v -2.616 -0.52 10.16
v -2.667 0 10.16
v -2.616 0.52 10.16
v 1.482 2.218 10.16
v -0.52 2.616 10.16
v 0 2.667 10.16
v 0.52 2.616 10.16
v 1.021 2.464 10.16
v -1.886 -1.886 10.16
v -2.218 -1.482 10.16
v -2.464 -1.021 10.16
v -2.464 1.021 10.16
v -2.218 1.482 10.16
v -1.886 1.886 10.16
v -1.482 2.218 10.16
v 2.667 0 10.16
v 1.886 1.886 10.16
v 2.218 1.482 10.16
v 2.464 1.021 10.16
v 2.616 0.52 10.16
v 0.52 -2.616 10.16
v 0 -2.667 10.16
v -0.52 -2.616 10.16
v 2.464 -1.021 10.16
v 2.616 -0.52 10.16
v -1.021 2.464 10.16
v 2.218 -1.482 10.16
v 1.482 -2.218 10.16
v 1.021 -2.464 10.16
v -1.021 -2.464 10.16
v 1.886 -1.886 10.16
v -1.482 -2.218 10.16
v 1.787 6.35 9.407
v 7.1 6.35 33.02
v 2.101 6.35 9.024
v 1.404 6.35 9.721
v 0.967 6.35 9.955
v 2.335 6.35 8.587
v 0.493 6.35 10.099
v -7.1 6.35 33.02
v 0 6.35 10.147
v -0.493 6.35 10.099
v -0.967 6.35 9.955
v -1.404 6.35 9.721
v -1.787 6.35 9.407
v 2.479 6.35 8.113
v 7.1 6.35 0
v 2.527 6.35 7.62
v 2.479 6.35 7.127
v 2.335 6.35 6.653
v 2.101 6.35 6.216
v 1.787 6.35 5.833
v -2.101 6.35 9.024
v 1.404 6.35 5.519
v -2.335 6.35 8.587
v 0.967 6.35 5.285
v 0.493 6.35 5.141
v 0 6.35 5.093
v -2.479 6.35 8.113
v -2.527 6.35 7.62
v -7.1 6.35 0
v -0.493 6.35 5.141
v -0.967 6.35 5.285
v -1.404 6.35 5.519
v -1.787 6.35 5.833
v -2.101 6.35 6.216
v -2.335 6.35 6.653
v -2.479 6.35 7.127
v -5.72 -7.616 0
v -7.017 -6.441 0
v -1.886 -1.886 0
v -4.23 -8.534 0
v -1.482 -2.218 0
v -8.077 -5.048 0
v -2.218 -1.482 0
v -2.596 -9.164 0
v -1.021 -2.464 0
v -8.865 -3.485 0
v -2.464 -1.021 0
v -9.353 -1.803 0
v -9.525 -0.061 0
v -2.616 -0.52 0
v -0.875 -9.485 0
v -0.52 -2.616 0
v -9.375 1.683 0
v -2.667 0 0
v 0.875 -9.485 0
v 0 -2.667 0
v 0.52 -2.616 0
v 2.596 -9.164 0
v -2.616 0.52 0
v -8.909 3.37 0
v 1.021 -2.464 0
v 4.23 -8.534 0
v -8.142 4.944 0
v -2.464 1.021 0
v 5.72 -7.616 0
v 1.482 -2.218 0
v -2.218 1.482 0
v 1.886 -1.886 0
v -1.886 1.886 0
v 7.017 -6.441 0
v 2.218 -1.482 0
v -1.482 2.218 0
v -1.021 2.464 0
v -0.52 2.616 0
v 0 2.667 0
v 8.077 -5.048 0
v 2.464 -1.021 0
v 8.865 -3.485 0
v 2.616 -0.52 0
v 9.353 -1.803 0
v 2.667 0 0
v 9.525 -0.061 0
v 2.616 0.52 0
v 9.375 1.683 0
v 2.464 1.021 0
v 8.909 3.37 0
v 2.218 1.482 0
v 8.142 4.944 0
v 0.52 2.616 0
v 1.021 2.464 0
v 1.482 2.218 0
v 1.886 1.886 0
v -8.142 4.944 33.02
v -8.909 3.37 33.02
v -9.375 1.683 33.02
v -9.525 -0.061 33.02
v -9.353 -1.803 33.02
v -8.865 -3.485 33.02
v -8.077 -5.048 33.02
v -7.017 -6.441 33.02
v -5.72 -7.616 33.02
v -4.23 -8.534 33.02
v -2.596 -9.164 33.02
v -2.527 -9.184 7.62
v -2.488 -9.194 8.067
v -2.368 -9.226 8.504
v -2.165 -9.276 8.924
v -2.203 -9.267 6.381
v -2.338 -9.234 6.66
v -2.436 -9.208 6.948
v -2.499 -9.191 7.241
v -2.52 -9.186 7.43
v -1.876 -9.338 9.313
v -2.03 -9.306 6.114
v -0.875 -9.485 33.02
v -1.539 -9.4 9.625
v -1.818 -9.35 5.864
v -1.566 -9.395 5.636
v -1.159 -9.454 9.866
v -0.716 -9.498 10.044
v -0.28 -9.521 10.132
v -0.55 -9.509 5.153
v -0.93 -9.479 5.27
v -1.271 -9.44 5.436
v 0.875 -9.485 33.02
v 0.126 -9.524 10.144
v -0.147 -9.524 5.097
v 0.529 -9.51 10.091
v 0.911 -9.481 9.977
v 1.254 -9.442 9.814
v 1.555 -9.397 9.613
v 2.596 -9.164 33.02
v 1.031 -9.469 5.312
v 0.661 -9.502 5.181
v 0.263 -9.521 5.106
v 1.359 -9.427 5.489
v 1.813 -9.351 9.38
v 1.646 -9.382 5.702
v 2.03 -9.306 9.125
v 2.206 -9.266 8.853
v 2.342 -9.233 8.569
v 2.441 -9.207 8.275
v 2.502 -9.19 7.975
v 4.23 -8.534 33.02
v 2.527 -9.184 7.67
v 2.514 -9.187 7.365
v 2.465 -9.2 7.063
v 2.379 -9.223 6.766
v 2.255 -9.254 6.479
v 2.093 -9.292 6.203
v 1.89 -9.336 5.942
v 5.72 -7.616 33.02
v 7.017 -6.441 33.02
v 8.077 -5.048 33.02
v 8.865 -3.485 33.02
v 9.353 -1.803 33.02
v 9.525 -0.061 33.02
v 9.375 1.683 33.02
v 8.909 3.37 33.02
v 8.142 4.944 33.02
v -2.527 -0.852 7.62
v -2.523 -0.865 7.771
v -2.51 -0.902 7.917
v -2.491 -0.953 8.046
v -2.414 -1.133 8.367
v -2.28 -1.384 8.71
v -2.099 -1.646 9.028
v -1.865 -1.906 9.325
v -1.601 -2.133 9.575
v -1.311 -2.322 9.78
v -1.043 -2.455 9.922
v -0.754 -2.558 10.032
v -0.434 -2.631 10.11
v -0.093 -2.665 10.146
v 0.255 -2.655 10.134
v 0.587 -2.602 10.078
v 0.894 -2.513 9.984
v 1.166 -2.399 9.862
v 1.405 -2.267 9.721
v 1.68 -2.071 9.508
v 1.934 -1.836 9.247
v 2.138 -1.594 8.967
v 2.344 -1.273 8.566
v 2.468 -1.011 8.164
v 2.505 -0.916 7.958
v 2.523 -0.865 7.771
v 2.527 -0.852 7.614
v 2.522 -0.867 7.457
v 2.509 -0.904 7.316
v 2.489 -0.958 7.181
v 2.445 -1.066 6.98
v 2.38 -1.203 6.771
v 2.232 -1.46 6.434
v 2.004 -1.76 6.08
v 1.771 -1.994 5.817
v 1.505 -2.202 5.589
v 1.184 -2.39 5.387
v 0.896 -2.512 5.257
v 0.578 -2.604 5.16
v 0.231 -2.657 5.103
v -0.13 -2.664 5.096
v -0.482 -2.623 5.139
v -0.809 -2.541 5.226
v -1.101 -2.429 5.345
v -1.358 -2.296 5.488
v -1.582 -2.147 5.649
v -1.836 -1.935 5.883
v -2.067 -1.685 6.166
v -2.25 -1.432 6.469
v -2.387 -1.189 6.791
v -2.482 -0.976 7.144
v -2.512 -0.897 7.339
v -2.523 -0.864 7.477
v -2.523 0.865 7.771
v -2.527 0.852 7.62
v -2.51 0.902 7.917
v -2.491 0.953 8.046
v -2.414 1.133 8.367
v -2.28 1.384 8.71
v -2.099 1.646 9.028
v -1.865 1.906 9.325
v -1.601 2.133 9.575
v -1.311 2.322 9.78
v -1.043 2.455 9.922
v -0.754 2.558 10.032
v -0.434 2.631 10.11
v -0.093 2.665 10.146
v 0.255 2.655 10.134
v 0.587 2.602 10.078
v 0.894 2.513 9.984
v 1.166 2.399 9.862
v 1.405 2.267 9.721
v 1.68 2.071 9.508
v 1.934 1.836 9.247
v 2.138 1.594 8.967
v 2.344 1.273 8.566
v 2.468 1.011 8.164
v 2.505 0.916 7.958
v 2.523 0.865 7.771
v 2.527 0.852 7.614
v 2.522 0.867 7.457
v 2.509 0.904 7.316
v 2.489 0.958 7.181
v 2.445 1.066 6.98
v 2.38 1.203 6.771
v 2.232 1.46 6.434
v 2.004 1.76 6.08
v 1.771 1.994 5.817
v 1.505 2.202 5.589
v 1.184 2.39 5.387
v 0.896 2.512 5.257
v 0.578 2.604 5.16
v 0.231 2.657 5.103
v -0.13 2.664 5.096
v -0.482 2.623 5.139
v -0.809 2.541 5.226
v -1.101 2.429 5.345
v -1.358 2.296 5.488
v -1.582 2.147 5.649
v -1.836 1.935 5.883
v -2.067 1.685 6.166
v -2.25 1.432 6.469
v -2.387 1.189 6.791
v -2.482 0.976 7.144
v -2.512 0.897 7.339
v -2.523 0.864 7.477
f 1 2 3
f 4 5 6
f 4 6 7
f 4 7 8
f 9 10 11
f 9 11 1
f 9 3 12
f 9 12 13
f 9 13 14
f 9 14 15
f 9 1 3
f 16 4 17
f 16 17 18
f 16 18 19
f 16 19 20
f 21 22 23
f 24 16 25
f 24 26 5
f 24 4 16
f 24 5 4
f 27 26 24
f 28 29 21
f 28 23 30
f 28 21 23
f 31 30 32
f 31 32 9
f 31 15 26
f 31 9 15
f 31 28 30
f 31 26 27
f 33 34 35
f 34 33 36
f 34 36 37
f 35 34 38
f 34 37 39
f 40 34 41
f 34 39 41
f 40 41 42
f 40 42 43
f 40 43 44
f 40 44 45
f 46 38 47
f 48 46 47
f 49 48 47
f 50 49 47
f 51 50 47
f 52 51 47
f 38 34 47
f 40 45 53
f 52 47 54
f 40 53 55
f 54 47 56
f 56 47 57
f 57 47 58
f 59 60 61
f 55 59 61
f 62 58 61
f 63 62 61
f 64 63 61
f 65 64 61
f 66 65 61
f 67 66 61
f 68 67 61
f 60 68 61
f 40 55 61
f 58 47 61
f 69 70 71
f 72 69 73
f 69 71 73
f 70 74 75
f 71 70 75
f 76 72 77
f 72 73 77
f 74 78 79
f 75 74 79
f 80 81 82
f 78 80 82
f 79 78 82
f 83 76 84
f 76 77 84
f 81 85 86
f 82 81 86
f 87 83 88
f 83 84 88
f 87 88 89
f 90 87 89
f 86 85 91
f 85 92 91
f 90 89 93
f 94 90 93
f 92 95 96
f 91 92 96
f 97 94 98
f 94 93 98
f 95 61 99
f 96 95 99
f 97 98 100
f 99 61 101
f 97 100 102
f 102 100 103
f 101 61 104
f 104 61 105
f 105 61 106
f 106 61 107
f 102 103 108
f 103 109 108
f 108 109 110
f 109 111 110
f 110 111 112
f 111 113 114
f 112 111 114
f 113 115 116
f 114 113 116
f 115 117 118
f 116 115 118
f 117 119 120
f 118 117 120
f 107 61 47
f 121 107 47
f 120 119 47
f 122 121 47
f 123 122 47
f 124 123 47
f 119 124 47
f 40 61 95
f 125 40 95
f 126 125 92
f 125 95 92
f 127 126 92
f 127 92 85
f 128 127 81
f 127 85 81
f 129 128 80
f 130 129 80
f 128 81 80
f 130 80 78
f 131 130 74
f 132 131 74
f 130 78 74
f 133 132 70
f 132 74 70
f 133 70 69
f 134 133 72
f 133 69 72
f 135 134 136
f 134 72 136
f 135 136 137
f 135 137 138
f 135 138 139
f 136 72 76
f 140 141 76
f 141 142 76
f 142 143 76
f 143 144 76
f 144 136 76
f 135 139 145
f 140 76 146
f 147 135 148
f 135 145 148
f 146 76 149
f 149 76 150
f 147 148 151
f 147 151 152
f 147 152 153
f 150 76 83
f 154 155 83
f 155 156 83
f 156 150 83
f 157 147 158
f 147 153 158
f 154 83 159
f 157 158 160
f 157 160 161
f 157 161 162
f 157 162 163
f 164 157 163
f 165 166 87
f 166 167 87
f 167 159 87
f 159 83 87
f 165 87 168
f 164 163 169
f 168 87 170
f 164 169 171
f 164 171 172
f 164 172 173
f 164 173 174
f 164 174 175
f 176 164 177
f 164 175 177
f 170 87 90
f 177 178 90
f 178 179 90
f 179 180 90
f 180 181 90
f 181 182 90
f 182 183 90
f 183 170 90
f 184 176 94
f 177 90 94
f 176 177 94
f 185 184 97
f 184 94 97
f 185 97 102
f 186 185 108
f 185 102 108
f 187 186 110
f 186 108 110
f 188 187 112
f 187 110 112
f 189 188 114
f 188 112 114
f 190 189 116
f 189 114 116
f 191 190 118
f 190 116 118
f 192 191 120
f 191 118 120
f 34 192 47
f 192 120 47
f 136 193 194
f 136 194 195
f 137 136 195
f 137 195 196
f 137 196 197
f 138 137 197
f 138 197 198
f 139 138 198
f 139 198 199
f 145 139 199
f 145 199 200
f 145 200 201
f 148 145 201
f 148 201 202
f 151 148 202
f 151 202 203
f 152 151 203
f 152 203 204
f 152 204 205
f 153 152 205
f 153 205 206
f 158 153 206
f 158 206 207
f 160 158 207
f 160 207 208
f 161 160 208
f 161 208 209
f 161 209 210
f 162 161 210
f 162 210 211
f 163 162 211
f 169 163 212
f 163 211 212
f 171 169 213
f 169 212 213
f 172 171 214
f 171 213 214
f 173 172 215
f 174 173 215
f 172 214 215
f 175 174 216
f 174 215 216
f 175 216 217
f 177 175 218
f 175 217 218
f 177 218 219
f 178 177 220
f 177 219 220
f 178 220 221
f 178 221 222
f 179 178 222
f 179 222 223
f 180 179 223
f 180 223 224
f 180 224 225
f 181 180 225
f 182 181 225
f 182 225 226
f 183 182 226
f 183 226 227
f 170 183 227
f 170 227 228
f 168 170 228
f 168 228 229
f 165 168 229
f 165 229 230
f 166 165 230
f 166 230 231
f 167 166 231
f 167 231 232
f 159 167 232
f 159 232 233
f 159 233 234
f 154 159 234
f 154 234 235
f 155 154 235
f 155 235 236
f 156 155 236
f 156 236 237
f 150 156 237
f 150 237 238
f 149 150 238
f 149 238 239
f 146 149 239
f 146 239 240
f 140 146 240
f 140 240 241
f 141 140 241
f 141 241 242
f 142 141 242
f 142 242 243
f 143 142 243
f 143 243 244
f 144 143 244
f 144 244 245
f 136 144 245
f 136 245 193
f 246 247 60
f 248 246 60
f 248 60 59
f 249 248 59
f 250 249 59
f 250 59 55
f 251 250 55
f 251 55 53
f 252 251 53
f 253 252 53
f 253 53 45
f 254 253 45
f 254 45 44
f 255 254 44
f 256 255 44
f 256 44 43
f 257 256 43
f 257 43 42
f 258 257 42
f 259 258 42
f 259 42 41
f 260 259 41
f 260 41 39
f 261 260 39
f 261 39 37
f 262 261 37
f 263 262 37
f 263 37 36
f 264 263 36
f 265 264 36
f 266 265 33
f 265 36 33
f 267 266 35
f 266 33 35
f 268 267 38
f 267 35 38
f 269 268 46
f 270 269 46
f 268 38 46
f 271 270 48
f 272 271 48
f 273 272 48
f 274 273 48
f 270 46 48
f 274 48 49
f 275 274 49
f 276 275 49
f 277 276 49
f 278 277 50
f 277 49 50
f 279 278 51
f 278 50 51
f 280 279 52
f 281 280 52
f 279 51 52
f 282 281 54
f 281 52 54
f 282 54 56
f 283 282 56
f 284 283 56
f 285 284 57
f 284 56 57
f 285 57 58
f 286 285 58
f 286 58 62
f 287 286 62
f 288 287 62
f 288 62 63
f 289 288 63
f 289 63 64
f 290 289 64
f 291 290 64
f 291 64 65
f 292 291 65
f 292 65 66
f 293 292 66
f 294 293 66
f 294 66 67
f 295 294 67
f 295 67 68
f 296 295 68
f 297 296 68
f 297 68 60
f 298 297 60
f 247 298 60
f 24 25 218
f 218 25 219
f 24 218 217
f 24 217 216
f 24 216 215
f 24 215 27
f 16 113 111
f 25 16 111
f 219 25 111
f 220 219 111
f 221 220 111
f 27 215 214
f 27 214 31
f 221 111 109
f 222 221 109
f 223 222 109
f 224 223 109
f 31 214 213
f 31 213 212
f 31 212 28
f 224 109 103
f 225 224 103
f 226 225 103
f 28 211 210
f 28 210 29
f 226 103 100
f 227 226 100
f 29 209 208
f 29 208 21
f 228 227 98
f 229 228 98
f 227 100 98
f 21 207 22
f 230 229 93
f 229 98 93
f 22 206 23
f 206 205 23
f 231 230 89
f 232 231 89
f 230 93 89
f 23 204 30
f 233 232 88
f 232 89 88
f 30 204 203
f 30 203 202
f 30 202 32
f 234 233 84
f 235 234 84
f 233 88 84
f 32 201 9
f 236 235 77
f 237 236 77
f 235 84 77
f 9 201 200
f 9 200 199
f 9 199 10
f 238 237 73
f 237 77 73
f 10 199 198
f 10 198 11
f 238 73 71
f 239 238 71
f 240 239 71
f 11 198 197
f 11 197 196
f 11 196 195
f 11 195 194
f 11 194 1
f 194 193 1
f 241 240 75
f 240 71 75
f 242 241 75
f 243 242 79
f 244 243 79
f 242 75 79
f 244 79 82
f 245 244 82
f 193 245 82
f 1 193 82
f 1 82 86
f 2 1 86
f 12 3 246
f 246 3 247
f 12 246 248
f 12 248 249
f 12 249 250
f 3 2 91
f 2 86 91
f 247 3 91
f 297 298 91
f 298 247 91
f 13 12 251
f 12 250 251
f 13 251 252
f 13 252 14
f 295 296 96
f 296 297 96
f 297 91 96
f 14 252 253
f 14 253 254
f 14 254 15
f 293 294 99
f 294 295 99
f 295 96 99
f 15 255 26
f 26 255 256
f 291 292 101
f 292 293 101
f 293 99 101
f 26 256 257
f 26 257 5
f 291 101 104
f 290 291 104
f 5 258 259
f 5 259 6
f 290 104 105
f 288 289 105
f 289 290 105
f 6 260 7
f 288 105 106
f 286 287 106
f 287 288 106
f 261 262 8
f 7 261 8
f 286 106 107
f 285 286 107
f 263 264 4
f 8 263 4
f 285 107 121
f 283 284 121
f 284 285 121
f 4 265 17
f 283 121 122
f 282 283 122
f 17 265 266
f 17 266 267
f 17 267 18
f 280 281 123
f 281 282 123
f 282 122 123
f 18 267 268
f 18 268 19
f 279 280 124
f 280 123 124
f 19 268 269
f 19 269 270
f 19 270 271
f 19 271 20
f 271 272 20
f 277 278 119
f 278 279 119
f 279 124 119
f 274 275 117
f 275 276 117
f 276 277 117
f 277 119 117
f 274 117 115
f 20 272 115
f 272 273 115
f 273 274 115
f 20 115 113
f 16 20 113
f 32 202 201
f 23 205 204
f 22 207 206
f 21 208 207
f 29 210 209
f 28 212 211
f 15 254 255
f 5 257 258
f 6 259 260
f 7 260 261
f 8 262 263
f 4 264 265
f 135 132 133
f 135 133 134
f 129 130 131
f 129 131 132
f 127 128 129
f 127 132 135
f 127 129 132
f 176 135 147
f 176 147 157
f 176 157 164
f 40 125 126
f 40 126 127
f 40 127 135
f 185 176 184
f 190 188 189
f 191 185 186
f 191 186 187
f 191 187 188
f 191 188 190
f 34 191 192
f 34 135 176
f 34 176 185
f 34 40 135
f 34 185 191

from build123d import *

# Parameters (mm, degrees)
F1_DEPTH = 33.02
F2_R     = 2.5273
F3_DEPTH = 25.4
F4_R     = 2.667
F5_DEPTH = 10.16


with BuildPart() as f1:
    # F0 (on Top) → F1 (new body)
    with BuildSketch(Plane.XY):
        with BuildLine():
            Line((7.099516, 6.35), (-7.099516, 6.35))
            ThreePointArc((-7.099516, 6.35), (0, -9.525), (7.099516, 6.35))
        make_face()
    extrude(amount=F1_DEPTH)

    # F2 (on face) → F3 (cut)
    with BuildSketch(Plane(origin=(0, 6.35, 0), x_dir=(-1, 0, 0), z_dir=(0, 1, 0))):
        with Locations((0, 7.62)):
            Circle(F2_R)
    extrude(amount=-F3_DEPTH, mode=Mode.SUBTRACT)

    # F4 (on face) → F5 (cut)
    with BuildSketch(Plane(origin=(0, 0, 0), x_dir=(1, 0, 0), z_dir=(0, 0, -1))):
        Circle(F4_R)
    extrude(amount=-F5_DEPTH, mode=Mode.SUBTRACT)


solid = f1.part
